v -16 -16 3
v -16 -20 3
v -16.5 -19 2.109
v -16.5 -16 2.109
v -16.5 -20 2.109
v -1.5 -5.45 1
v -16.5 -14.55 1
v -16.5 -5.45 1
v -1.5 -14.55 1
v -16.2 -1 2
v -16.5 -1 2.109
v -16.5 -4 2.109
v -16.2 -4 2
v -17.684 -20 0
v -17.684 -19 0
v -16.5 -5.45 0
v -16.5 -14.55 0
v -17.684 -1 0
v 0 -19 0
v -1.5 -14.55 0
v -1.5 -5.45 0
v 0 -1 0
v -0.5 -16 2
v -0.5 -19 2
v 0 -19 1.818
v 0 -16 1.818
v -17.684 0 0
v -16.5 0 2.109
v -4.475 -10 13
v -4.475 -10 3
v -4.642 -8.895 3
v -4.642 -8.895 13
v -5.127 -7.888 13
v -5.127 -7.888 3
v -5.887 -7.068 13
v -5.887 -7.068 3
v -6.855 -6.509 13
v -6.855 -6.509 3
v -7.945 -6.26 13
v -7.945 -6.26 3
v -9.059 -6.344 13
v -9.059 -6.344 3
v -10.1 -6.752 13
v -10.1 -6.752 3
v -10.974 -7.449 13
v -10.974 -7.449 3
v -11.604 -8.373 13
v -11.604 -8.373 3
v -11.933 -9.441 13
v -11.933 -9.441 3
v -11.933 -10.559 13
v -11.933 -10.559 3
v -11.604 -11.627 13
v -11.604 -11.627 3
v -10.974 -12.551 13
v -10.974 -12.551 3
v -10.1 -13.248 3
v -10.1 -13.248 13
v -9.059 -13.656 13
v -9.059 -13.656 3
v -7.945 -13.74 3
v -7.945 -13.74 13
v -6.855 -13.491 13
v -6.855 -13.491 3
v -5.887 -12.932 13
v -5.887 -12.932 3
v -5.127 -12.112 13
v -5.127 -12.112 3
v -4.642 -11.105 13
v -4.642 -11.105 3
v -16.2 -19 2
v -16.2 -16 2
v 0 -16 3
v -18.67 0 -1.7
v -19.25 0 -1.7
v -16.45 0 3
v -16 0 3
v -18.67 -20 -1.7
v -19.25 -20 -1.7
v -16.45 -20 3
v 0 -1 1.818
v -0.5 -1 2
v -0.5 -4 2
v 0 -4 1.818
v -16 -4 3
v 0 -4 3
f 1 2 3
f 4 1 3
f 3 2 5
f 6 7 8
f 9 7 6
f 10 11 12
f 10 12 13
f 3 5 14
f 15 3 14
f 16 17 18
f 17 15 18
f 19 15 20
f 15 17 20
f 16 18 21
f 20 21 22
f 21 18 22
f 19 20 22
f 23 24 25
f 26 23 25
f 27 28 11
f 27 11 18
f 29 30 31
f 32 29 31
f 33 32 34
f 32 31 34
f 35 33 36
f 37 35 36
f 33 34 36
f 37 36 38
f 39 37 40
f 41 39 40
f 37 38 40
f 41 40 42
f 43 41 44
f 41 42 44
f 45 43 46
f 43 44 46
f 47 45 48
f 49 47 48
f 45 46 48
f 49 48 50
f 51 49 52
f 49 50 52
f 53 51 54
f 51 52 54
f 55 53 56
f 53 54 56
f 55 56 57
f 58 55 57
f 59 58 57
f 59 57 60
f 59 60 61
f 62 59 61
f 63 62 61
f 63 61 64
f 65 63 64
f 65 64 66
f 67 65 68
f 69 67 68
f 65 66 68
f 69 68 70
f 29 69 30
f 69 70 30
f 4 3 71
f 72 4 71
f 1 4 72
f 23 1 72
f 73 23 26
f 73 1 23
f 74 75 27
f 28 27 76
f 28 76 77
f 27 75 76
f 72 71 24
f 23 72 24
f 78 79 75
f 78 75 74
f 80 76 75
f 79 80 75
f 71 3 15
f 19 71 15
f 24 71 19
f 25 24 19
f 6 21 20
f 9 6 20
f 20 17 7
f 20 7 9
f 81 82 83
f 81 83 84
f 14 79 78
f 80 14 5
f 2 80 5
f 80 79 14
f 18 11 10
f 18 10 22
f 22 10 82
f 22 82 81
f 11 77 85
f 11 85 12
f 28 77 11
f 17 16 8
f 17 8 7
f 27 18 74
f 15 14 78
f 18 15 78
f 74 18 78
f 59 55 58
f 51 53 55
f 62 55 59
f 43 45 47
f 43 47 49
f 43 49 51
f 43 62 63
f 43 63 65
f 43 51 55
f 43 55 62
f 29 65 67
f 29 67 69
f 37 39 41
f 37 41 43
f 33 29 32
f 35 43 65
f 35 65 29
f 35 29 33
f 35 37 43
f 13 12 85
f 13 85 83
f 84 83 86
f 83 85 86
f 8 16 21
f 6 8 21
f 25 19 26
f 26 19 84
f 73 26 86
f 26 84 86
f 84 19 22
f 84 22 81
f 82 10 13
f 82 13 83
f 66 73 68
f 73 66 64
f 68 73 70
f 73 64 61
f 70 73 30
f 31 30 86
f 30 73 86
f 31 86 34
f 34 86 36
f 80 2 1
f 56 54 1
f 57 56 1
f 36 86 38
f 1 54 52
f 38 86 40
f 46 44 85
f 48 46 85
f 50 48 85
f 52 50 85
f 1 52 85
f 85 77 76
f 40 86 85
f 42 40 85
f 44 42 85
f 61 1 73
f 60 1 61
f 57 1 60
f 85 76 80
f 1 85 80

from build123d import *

# Parameters (mm, degrees)
F1_DEPTH  = 20
F3_DEPTH  = 4
F5_DEPTH  = 1
F7_DEPTH  = 20.001
F10_W     = 15
F10_H     = 9.1
F11_DEPTH = 1
F8_R      = 3.75
F12_DEPTH = 10


# Not quite as in the source:
# - a pattern or mirror of a feature is missing from the dataset's text; its kind, count and spacing are read off the source's solid


with BuildPart() as f1:
    # F0 (on Front) → F1 (new body)
    with BuildSketch(Plane.XZ):
        Polygon((-16.45, 3), (-19.25, -1.7), (-18.09, -1.7), (-17.0772340426, 0), (0, 0), (0, 3), align=None)
    extrude(amount=F1_DEPTH)

    # F2 (on face) → F3 (cut)
    with BuildSketch(Plane.XZ.offset(20)):
        Polygon((-16.2, 2), (-0.5, 2), (0, 1.8180148829), (0, 3), (-16, 3), (-16.5, 2.1091910703), align=None)
    f3 = extrude(amount=-F3_DEPTH, mode=Mode.SUBTRACT)

    # F3_copies: F3 across plane
    add(f3.mirror(Plane.ZX.offset(-10)), mode=Mode.SUBTRACT)

    # F4 (on face) → F5 (cut)
    with BuildSketch(Plane.XZ.offset(20)):
        Polygon((0, 0), (0, 1.8180148829), (-0.5, 2), (-16.2, 2), (-16.5, 2.1091910703), (-17.683862779, 0), align=None)
    f5 = extrude(amount=-F5_DEPTH, mode=Mode.SUBTRACT)

    # F5_copies: F5 across plane
    add(f5.mirror(Plane.ZX.offset(-10)), mode=Mode.SUBTRACT)

    # F6 (on face) → F7 (cut, through all)
    with BuildSketch(Plane.XZ.offset(20)):
        Polygon((-18.67, -1.7), (-18.09, -1.7), (-17.0772340426, 0), (-17.683862779, 0), align=None)
    extrude(amount=-F7_DEPTH, mode=Mode.SUBTRACT)

    # F10 (on face) → F11 (cut)
    with BuildSketch(Plane(origin=(0, 0, 0), x_dir=(1, 0, 0), z_dir=(0, 0, -1))):
        with Locations((-9, 10)):
            Rectangle(F10_W, F10_H)
    extrude(amount=-F11_DEPTH, mode=Mode.SUBTRACT)

    # F8 (on face) → F12 (join)
    with BuildSketch(Plane.XY.offset(3)):
        with Locations((-8.225, -10)):
            Circle(F8_R)
    extrude(amount=F12_DEPTH)


solid = f1.part
